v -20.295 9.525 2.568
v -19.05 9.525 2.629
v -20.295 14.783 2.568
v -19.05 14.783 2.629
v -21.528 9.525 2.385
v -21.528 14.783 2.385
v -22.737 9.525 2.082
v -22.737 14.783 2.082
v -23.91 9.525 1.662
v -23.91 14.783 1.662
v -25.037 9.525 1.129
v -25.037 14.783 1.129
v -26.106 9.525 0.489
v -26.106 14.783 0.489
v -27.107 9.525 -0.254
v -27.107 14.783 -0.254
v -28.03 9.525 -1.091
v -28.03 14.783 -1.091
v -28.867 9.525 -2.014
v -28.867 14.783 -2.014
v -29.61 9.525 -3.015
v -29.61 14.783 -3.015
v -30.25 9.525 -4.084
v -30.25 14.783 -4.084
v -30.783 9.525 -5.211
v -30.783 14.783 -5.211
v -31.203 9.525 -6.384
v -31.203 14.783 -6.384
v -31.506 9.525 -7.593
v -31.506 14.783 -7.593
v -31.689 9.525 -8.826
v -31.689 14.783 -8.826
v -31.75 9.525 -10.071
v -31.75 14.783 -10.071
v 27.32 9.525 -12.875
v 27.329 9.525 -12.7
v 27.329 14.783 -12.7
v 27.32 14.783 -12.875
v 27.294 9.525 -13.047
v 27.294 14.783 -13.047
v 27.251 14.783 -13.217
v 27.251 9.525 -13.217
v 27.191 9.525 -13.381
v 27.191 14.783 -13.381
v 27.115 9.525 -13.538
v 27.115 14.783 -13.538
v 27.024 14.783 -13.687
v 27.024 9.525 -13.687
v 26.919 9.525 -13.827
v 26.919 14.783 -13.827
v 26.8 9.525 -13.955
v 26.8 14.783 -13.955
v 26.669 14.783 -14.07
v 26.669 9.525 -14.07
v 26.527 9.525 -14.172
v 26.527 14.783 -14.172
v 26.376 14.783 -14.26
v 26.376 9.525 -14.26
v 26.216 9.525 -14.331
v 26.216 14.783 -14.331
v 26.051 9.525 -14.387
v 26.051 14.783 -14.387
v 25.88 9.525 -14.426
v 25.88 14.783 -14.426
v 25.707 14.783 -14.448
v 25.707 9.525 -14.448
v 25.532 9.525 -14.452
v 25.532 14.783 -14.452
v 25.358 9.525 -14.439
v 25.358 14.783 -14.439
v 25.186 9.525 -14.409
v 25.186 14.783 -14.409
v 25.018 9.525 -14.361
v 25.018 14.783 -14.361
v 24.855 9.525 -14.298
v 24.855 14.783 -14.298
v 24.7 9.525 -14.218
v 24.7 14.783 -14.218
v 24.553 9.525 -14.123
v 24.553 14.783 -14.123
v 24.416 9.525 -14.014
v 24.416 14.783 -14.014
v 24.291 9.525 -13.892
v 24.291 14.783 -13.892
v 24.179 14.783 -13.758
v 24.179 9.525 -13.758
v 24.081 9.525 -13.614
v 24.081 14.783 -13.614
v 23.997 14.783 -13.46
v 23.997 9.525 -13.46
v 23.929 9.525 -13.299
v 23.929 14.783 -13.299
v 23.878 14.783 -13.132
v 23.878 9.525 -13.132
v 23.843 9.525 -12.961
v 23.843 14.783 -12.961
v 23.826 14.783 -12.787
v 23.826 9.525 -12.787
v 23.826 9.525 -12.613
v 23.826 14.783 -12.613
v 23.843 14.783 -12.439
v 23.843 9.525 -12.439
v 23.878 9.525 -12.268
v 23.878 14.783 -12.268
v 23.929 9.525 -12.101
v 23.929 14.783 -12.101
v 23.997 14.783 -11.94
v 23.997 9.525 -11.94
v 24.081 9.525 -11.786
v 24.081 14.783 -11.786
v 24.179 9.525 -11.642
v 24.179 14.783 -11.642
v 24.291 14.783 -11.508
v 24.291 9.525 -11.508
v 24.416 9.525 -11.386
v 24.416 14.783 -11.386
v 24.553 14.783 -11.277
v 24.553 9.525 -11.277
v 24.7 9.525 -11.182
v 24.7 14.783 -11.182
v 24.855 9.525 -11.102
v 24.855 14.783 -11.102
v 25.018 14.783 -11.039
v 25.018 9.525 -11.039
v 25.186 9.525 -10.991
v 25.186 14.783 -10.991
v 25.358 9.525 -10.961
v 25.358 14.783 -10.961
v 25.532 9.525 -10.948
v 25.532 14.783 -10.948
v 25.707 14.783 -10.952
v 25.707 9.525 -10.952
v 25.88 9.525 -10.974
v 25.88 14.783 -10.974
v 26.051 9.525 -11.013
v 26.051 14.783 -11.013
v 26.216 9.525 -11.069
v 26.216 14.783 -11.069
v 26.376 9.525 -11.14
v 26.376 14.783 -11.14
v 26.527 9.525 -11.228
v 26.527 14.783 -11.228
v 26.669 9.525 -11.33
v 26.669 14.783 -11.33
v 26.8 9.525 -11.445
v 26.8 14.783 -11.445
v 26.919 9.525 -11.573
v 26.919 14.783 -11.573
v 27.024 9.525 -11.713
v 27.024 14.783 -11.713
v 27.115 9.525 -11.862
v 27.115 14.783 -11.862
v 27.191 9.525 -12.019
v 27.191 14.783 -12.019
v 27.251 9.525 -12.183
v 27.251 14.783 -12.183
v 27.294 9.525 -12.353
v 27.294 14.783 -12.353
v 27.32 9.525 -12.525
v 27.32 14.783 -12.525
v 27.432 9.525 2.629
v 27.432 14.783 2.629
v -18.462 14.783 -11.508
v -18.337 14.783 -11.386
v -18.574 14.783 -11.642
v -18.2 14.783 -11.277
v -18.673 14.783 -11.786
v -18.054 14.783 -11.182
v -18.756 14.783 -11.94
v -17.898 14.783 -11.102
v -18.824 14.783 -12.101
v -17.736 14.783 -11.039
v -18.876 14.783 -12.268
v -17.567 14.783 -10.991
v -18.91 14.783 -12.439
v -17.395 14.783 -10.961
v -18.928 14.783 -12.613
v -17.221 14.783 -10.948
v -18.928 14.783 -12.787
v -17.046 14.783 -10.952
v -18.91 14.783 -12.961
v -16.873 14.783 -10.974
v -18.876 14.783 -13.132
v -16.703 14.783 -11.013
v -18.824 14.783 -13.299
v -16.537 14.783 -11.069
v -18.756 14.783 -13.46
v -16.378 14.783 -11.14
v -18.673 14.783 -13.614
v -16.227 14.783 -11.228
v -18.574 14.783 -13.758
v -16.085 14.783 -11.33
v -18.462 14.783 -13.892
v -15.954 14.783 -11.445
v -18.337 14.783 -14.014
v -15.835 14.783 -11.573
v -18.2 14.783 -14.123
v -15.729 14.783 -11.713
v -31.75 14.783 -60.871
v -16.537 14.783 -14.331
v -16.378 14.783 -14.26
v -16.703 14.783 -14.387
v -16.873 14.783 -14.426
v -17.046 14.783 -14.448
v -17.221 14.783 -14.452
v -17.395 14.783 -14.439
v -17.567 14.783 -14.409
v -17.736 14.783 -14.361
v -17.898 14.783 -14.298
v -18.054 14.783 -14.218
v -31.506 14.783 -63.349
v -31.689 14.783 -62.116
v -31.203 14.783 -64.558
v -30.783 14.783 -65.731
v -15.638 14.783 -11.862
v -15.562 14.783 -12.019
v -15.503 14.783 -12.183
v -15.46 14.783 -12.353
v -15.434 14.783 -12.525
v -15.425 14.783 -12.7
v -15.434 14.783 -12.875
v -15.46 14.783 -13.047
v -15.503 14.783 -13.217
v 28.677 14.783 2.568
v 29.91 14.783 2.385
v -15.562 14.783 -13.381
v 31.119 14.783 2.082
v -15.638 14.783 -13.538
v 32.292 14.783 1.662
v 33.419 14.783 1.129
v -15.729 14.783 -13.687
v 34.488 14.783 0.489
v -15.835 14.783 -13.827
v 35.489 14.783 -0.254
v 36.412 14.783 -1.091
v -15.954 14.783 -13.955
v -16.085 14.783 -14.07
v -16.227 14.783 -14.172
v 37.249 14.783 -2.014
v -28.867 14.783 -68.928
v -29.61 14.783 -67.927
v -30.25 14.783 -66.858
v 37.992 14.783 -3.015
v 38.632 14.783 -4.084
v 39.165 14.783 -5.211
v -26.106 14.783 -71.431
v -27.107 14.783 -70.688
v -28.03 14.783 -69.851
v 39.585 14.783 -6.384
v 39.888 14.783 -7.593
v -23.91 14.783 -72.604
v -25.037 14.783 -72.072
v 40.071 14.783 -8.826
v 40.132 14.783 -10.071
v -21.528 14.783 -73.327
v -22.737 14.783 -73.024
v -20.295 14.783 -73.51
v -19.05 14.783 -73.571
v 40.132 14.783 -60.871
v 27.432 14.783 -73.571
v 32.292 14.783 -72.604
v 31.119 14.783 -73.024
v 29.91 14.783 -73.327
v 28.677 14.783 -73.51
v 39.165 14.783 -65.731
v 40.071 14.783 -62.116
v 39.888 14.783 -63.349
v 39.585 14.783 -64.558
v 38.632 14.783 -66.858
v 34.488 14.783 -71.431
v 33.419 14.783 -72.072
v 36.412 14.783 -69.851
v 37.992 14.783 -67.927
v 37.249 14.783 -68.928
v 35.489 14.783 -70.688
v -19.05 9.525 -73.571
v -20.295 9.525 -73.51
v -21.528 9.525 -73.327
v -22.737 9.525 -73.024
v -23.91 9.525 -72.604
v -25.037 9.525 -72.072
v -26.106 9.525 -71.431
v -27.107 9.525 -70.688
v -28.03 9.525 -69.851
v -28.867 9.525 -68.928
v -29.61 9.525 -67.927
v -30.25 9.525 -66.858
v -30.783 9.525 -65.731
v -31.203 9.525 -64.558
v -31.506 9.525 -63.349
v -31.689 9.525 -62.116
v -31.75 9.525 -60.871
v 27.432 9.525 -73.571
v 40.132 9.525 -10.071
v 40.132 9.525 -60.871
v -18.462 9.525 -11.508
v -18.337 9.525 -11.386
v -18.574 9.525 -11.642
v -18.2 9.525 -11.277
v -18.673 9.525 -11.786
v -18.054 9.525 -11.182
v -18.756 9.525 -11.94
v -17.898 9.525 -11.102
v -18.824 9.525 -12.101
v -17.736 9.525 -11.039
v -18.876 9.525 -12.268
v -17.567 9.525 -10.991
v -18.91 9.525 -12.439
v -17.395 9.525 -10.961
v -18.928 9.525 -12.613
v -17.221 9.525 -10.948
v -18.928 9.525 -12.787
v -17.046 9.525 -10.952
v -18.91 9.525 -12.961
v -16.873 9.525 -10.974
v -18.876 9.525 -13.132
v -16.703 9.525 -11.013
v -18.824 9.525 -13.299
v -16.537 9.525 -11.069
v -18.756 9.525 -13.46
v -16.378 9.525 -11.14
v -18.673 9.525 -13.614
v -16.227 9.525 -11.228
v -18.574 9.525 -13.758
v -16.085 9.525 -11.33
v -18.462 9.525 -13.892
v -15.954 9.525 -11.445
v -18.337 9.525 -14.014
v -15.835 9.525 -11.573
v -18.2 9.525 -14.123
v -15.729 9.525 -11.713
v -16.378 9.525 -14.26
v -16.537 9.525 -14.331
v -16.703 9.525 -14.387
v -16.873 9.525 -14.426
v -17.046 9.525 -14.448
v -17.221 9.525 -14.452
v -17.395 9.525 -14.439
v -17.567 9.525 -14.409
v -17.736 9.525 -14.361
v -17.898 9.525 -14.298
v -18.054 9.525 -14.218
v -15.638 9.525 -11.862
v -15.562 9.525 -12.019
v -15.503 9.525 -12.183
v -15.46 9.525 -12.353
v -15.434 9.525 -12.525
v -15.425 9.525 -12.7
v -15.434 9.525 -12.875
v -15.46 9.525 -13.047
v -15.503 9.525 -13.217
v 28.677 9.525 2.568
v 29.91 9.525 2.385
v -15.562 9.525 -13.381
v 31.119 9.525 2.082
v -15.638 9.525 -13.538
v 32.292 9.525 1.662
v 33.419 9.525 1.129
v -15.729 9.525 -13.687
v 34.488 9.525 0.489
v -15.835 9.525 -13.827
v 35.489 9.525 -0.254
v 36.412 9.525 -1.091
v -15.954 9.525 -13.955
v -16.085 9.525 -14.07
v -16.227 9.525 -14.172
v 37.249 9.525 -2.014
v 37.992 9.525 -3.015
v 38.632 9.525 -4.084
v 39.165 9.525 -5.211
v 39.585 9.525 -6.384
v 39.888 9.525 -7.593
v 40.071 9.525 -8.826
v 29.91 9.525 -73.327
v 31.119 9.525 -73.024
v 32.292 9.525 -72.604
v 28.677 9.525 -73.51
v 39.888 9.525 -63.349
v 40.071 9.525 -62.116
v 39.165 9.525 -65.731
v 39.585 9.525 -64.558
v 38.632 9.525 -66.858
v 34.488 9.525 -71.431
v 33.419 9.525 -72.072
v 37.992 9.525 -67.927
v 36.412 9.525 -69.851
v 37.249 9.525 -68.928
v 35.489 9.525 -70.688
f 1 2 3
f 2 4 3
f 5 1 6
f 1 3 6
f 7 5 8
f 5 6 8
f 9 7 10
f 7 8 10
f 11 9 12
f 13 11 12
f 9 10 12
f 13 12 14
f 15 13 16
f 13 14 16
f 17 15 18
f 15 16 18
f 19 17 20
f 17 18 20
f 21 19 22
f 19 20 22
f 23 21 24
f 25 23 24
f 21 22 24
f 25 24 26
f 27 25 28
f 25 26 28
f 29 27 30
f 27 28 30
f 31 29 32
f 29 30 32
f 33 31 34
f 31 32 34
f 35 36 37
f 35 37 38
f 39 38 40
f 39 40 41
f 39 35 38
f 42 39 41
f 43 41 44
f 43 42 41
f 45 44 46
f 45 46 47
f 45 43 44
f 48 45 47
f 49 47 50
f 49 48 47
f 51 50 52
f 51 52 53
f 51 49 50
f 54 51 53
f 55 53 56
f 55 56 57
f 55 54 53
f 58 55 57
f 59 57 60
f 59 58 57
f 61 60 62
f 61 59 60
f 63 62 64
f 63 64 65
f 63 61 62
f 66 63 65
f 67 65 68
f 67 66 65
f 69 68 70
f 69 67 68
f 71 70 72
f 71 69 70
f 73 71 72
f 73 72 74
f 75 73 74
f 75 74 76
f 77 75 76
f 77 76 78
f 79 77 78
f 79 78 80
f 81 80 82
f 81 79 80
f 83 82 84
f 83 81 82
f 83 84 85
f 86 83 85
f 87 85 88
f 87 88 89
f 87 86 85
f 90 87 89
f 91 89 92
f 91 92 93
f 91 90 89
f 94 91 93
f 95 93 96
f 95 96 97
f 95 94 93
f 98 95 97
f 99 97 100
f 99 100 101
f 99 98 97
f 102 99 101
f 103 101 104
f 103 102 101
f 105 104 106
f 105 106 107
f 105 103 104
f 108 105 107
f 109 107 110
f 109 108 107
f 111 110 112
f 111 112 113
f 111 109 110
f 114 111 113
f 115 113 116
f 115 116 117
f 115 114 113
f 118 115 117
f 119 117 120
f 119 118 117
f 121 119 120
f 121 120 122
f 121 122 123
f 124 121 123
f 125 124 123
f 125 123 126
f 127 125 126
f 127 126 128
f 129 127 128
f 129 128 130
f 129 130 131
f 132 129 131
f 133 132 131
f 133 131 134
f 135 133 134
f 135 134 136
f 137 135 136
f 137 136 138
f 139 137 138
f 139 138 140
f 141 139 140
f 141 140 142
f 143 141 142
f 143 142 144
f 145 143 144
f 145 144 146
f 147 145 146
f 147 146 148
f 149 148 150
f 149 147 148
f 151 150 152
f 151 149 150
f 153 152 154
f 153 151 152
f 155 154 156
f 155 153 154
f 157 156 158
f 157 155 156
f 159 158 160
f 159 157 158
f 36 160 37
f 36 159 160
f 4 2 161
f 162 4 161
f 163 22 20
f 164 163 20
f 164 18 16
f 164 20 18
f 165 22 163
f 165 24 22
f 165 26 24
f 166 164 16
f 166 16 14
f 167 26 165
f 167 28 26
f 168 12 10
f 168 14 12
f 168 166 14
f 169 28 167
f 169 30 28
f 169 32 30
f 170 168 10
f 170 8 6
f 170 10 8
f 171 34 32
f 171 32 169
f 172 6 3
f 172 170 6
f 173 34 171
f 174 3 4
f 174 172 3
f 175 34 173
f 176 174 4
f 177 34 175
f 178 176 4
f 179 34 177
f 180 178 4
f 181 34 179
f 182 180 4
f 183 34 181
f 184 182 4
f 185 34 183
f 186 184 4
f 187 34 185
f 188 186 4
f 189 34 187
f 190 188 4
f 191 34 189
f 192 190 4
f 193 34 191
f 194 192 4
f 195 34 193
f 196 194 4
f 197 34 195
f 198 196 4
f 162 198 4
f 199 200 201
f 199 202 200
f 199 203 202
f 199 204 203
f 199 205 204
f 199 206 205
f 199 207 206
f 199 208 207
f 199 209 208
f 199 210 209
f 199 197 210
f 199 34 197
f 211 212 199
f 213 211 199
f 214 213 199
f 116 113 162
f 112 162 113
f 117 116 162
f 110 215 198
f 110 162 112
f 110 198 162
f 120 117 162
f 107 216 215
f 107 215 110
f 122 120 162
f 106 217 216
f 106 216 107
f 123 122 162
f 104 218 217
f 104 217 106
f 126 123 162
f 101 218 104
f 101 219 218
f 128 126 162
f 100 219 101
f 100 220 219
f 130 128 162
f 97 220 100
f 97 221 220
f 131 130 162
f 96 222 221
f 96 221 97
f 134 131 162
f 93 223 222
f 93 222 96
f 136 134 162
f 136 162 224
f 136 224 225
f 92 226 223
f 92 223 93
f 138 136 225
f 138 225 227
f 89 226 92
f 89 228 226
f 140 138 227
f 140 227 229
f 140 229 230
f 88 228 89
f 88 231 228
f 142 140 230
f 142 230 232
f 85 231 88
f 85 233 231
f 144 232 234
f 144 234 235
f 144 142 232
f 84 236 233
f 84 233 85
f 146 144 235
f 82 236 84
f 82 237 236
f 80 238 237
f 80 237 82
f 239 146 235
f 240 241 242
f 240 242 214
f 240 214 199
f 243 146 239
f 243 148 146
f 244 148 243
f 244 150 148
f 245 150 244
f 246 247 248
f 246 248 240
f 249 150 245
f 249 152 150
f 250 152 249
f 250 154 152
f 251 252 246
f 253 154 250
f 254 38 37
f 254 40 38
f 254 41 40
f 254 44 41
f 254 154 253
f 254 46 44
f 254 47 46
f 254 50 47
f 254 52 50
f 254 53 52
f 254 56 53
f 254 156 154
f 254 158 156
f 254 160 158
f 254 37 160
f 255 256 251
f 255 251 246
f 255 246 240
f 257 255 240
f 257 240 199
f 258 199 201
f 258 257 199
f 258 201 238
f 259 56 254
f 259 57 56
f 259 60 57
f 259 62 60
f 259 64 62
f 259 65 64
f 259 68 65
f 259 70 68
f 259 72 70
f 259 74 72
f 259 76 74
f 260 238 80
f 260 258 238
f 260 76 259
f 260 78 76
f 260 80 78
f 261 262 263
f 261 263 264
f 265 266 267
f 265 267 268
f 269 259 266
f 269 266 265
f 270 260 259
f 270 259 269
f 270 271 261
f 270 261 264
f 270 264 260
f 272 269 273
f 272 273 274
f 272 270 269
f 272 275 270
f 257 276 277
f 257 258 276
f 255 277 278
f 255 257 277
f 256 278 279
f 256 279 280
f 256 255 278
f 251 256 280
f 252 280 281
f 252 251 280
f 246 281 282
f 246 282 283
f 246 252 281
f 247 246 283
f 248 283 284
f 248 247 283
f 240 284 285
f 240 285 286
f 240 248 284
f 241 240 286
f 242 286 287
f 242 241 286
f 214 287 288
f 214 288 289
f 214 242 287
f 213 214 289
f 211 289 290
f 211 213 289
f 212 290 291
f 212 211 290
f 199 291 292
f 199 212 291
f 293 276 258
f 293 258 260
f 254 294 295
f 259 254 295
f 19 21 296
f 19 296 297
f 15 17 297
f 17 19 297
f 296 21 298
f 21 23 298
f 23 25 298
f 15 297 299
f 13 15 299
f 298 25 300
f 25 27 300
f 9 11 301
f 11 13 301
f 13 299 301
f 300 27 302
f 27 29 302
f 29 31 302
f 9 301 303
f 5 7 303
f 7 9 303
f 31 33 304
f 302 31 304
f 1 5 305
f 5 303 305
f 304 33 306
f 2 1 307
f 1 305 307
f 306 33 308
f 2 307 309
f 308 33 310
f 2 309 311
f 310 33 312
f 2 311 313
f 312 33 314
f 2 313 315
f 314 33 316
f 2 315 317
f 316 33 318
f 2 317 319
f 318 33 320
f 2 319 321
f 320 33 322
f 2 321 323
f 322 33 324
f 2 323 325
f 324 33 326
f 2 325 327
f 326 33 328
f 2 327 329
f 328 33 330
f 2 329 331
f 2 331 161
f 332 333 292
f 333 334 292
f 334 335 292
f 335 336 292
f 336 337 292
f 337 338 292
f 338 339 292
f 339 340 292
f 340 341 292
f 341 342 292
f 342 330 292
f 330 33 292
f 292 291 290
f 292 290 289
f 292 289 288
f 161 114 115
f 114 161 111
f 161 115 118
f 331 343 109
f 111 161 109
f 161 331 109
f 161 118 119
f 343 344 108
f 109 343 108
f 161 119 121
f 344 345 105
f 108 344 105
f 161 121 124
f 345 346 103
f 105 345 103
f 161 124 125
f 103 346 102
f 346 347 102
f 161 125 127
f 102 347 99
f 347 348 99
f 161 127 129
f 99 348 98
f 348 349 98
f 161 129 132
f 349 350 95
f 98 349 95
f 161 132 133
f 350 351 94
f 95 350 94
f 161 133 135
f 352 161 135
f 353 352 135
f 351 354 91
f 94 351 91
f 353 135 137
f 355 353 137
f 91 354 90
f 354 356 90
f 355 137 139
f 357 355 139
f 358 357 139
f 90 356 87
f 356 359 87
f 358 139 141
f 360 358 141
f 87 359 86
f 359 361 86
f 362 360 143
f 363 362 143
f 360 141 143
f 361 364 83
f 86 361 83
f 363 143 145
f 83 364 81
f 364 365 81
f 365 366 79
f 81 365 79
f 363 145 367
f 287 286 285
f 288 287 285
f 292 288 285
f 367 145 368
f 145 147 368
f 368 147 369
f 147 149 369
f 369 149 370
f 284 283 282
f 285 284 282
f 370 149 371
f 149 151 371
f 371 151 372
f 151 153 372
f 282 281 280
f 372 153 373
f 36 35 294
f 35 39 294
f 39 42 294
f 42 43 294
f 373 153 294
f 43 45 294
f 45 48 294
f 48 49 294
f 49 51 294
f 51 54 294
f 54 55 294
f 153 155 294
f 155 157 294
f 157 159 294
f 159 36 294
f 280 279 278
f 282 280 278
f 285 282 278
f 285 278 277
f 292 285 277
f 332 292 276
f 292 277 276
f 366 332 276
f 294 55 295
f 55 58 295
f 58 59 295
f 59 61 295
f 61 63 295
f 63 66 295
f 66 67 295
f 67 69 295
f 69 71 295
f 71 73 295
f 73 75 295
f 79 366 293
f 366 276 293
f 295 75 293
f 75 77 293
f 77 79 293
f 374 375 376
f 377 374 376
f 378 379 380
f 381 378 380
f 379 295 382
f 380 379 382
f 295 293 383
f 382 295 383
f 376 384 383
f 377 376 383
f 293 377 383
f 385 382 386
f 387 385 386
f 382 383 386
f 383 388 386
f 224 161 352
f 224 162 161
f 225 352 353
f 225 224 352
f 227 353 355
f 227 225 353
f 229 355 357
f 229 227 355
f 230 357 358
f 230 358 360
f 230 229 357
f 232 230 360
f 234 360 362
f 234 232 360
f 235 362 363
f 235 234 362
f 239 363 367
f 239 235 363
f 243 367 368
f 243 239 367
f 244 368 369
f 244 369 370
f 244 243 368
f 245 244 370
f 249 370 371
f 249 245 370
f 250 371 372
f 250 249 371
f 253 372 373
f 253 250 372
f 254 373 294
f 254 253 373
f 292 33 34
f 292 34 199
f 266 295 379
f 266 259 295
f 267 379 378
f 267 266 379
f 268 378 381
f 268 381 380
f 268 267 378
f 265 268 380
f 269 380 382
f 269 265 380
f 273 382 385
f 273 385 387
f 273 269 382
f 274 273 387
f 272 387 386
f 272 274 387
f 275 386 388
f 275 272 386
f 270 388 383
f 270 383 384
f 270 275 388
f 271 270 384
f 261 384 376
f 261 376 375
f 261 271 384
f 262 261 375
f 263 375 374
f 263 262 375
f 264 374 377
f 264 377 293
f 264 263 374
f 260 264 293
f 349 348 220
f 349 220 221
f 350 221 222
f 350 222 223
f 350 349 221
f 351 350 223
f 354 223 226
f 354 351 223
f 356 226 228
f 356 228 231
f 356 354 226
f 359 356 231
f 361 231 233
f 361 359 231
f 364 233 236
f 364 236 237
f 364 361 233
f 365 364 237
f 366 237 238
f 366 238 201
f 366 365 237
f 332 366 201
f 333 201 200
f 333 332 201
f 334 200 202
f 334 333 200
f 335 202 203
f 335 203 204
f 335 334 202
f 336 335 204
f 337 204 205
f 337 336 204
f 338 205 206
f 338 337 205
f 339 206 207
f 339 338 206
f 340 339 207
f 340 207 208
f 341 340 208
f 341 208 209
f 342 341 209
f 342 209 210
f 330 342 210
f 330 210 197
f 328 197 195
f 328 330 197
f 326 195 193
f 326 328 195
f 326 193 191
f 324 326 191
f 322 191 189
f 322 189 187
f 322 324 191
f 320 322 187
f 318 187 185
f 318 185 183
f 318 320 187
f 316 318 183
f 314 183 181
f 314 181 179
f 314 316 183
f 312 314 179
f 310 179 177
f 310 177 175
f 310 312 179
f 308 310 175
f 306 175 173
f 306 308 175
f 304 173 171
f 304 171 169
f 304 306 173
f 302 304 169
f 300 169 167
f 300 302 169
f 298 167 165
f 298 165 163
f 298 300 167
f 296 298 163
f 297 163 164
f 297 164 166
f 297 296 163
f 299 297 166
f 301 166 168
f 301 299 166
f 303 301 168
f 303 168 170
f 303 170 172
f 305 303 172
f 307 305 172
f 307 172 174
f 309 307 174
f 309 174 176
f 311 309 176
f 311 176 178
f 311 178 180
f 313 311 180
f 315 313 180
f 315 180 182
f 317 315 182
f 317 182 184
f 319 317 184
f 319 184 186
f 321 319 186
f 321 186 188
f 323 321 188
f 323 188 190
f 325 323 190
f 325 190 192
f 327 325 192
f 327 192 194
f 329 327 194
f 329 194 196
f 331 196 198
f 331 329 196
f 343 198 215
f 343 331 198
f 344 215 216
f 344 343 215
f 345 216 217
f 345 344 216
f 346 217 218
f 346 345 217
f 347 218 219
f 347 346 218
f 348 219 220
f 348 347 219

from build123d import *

# Parameters (mm, degrees)
SKETCH2_W           = 71.882
SKETCH2_H           = 76.2
BOSS_EXTRUDE2_DEPTH = 5.2578
CAVITY1_START       = 9.525
CAVITY1_OUTLINE_R   = 1.7526
CAVITY1_DEPTH       = 5.2578
FILLET3_R           = 12.7
FILLET4_R           = 12.7
FILLET5_R           = 12.7
FILLET6_R           = 12.7


# Read off the part's stored shape, not the designer's step: Cavity1
with BuildPart() as part:
    # Sketch2 → Boss-Extrude2 (new body)
    with BuildSketch(Plane(origin=(0, 9.525, 0), x_dir=(1, 0, 0), z_dir=(0, 1, 0))):
        with Locations((4.191, 35.4711)):
            Rectangle(SKETCH2_W, SKETCH2_H)
    extrude(amount=BOSS_EXTRUDE2_DEPTH)

    # Cavity1 outline → Cavity1 (cut)
    with BuildSketch(Plane(origin=(0, 0, 0), x_dir=(1, 0, 0), z_dir=(0, 1, 0)).offset(CAVITY1_START)):
        with Locations((25.576048817, 12.7)):
            Circle(CAVITY1_OUTLINE_R)
        with Locations((-17.177400647, 12.7)):
            Circle(CAVITY1_OUTLINE_R)
    extrude(amount=CAVITY1_DEPTH, mode=Mode.SUBTRACT)

    # Fillet3
    fillet3_edges = [part.edges().sort_by_distance(p)[0] for p in [
        (40.132, 12.1539, 2.6289),
    ]]
    fillet(fillet3_edges, radius=FILLET3_R)

    # Fillet4
    fillet4_edges = [part.edges().sort_by_distance(p)[0] for p in [
        (-31.75, 12.1539, 2.6289),
    ]]
    fillet(fillet4_edges, radius=FILLET4_R)

    # Fillet5
    fillet5_edges = [part.edges().sort_by_distance(p)[0] for p in [
        (40.132, 12.1539, -73.5711),
    ]]
    fillet(fillet5_edges, radius=FILLET5_R)

    # Fillet6
    fillet6_edges = [part.edges().sort_by_distance(p)[0] for p in [
        (-31.75, 12.1539, -73.5711),
    ]]
    fillet(fillet6_edges, radius=FILLET6_R)


solid = part.part
